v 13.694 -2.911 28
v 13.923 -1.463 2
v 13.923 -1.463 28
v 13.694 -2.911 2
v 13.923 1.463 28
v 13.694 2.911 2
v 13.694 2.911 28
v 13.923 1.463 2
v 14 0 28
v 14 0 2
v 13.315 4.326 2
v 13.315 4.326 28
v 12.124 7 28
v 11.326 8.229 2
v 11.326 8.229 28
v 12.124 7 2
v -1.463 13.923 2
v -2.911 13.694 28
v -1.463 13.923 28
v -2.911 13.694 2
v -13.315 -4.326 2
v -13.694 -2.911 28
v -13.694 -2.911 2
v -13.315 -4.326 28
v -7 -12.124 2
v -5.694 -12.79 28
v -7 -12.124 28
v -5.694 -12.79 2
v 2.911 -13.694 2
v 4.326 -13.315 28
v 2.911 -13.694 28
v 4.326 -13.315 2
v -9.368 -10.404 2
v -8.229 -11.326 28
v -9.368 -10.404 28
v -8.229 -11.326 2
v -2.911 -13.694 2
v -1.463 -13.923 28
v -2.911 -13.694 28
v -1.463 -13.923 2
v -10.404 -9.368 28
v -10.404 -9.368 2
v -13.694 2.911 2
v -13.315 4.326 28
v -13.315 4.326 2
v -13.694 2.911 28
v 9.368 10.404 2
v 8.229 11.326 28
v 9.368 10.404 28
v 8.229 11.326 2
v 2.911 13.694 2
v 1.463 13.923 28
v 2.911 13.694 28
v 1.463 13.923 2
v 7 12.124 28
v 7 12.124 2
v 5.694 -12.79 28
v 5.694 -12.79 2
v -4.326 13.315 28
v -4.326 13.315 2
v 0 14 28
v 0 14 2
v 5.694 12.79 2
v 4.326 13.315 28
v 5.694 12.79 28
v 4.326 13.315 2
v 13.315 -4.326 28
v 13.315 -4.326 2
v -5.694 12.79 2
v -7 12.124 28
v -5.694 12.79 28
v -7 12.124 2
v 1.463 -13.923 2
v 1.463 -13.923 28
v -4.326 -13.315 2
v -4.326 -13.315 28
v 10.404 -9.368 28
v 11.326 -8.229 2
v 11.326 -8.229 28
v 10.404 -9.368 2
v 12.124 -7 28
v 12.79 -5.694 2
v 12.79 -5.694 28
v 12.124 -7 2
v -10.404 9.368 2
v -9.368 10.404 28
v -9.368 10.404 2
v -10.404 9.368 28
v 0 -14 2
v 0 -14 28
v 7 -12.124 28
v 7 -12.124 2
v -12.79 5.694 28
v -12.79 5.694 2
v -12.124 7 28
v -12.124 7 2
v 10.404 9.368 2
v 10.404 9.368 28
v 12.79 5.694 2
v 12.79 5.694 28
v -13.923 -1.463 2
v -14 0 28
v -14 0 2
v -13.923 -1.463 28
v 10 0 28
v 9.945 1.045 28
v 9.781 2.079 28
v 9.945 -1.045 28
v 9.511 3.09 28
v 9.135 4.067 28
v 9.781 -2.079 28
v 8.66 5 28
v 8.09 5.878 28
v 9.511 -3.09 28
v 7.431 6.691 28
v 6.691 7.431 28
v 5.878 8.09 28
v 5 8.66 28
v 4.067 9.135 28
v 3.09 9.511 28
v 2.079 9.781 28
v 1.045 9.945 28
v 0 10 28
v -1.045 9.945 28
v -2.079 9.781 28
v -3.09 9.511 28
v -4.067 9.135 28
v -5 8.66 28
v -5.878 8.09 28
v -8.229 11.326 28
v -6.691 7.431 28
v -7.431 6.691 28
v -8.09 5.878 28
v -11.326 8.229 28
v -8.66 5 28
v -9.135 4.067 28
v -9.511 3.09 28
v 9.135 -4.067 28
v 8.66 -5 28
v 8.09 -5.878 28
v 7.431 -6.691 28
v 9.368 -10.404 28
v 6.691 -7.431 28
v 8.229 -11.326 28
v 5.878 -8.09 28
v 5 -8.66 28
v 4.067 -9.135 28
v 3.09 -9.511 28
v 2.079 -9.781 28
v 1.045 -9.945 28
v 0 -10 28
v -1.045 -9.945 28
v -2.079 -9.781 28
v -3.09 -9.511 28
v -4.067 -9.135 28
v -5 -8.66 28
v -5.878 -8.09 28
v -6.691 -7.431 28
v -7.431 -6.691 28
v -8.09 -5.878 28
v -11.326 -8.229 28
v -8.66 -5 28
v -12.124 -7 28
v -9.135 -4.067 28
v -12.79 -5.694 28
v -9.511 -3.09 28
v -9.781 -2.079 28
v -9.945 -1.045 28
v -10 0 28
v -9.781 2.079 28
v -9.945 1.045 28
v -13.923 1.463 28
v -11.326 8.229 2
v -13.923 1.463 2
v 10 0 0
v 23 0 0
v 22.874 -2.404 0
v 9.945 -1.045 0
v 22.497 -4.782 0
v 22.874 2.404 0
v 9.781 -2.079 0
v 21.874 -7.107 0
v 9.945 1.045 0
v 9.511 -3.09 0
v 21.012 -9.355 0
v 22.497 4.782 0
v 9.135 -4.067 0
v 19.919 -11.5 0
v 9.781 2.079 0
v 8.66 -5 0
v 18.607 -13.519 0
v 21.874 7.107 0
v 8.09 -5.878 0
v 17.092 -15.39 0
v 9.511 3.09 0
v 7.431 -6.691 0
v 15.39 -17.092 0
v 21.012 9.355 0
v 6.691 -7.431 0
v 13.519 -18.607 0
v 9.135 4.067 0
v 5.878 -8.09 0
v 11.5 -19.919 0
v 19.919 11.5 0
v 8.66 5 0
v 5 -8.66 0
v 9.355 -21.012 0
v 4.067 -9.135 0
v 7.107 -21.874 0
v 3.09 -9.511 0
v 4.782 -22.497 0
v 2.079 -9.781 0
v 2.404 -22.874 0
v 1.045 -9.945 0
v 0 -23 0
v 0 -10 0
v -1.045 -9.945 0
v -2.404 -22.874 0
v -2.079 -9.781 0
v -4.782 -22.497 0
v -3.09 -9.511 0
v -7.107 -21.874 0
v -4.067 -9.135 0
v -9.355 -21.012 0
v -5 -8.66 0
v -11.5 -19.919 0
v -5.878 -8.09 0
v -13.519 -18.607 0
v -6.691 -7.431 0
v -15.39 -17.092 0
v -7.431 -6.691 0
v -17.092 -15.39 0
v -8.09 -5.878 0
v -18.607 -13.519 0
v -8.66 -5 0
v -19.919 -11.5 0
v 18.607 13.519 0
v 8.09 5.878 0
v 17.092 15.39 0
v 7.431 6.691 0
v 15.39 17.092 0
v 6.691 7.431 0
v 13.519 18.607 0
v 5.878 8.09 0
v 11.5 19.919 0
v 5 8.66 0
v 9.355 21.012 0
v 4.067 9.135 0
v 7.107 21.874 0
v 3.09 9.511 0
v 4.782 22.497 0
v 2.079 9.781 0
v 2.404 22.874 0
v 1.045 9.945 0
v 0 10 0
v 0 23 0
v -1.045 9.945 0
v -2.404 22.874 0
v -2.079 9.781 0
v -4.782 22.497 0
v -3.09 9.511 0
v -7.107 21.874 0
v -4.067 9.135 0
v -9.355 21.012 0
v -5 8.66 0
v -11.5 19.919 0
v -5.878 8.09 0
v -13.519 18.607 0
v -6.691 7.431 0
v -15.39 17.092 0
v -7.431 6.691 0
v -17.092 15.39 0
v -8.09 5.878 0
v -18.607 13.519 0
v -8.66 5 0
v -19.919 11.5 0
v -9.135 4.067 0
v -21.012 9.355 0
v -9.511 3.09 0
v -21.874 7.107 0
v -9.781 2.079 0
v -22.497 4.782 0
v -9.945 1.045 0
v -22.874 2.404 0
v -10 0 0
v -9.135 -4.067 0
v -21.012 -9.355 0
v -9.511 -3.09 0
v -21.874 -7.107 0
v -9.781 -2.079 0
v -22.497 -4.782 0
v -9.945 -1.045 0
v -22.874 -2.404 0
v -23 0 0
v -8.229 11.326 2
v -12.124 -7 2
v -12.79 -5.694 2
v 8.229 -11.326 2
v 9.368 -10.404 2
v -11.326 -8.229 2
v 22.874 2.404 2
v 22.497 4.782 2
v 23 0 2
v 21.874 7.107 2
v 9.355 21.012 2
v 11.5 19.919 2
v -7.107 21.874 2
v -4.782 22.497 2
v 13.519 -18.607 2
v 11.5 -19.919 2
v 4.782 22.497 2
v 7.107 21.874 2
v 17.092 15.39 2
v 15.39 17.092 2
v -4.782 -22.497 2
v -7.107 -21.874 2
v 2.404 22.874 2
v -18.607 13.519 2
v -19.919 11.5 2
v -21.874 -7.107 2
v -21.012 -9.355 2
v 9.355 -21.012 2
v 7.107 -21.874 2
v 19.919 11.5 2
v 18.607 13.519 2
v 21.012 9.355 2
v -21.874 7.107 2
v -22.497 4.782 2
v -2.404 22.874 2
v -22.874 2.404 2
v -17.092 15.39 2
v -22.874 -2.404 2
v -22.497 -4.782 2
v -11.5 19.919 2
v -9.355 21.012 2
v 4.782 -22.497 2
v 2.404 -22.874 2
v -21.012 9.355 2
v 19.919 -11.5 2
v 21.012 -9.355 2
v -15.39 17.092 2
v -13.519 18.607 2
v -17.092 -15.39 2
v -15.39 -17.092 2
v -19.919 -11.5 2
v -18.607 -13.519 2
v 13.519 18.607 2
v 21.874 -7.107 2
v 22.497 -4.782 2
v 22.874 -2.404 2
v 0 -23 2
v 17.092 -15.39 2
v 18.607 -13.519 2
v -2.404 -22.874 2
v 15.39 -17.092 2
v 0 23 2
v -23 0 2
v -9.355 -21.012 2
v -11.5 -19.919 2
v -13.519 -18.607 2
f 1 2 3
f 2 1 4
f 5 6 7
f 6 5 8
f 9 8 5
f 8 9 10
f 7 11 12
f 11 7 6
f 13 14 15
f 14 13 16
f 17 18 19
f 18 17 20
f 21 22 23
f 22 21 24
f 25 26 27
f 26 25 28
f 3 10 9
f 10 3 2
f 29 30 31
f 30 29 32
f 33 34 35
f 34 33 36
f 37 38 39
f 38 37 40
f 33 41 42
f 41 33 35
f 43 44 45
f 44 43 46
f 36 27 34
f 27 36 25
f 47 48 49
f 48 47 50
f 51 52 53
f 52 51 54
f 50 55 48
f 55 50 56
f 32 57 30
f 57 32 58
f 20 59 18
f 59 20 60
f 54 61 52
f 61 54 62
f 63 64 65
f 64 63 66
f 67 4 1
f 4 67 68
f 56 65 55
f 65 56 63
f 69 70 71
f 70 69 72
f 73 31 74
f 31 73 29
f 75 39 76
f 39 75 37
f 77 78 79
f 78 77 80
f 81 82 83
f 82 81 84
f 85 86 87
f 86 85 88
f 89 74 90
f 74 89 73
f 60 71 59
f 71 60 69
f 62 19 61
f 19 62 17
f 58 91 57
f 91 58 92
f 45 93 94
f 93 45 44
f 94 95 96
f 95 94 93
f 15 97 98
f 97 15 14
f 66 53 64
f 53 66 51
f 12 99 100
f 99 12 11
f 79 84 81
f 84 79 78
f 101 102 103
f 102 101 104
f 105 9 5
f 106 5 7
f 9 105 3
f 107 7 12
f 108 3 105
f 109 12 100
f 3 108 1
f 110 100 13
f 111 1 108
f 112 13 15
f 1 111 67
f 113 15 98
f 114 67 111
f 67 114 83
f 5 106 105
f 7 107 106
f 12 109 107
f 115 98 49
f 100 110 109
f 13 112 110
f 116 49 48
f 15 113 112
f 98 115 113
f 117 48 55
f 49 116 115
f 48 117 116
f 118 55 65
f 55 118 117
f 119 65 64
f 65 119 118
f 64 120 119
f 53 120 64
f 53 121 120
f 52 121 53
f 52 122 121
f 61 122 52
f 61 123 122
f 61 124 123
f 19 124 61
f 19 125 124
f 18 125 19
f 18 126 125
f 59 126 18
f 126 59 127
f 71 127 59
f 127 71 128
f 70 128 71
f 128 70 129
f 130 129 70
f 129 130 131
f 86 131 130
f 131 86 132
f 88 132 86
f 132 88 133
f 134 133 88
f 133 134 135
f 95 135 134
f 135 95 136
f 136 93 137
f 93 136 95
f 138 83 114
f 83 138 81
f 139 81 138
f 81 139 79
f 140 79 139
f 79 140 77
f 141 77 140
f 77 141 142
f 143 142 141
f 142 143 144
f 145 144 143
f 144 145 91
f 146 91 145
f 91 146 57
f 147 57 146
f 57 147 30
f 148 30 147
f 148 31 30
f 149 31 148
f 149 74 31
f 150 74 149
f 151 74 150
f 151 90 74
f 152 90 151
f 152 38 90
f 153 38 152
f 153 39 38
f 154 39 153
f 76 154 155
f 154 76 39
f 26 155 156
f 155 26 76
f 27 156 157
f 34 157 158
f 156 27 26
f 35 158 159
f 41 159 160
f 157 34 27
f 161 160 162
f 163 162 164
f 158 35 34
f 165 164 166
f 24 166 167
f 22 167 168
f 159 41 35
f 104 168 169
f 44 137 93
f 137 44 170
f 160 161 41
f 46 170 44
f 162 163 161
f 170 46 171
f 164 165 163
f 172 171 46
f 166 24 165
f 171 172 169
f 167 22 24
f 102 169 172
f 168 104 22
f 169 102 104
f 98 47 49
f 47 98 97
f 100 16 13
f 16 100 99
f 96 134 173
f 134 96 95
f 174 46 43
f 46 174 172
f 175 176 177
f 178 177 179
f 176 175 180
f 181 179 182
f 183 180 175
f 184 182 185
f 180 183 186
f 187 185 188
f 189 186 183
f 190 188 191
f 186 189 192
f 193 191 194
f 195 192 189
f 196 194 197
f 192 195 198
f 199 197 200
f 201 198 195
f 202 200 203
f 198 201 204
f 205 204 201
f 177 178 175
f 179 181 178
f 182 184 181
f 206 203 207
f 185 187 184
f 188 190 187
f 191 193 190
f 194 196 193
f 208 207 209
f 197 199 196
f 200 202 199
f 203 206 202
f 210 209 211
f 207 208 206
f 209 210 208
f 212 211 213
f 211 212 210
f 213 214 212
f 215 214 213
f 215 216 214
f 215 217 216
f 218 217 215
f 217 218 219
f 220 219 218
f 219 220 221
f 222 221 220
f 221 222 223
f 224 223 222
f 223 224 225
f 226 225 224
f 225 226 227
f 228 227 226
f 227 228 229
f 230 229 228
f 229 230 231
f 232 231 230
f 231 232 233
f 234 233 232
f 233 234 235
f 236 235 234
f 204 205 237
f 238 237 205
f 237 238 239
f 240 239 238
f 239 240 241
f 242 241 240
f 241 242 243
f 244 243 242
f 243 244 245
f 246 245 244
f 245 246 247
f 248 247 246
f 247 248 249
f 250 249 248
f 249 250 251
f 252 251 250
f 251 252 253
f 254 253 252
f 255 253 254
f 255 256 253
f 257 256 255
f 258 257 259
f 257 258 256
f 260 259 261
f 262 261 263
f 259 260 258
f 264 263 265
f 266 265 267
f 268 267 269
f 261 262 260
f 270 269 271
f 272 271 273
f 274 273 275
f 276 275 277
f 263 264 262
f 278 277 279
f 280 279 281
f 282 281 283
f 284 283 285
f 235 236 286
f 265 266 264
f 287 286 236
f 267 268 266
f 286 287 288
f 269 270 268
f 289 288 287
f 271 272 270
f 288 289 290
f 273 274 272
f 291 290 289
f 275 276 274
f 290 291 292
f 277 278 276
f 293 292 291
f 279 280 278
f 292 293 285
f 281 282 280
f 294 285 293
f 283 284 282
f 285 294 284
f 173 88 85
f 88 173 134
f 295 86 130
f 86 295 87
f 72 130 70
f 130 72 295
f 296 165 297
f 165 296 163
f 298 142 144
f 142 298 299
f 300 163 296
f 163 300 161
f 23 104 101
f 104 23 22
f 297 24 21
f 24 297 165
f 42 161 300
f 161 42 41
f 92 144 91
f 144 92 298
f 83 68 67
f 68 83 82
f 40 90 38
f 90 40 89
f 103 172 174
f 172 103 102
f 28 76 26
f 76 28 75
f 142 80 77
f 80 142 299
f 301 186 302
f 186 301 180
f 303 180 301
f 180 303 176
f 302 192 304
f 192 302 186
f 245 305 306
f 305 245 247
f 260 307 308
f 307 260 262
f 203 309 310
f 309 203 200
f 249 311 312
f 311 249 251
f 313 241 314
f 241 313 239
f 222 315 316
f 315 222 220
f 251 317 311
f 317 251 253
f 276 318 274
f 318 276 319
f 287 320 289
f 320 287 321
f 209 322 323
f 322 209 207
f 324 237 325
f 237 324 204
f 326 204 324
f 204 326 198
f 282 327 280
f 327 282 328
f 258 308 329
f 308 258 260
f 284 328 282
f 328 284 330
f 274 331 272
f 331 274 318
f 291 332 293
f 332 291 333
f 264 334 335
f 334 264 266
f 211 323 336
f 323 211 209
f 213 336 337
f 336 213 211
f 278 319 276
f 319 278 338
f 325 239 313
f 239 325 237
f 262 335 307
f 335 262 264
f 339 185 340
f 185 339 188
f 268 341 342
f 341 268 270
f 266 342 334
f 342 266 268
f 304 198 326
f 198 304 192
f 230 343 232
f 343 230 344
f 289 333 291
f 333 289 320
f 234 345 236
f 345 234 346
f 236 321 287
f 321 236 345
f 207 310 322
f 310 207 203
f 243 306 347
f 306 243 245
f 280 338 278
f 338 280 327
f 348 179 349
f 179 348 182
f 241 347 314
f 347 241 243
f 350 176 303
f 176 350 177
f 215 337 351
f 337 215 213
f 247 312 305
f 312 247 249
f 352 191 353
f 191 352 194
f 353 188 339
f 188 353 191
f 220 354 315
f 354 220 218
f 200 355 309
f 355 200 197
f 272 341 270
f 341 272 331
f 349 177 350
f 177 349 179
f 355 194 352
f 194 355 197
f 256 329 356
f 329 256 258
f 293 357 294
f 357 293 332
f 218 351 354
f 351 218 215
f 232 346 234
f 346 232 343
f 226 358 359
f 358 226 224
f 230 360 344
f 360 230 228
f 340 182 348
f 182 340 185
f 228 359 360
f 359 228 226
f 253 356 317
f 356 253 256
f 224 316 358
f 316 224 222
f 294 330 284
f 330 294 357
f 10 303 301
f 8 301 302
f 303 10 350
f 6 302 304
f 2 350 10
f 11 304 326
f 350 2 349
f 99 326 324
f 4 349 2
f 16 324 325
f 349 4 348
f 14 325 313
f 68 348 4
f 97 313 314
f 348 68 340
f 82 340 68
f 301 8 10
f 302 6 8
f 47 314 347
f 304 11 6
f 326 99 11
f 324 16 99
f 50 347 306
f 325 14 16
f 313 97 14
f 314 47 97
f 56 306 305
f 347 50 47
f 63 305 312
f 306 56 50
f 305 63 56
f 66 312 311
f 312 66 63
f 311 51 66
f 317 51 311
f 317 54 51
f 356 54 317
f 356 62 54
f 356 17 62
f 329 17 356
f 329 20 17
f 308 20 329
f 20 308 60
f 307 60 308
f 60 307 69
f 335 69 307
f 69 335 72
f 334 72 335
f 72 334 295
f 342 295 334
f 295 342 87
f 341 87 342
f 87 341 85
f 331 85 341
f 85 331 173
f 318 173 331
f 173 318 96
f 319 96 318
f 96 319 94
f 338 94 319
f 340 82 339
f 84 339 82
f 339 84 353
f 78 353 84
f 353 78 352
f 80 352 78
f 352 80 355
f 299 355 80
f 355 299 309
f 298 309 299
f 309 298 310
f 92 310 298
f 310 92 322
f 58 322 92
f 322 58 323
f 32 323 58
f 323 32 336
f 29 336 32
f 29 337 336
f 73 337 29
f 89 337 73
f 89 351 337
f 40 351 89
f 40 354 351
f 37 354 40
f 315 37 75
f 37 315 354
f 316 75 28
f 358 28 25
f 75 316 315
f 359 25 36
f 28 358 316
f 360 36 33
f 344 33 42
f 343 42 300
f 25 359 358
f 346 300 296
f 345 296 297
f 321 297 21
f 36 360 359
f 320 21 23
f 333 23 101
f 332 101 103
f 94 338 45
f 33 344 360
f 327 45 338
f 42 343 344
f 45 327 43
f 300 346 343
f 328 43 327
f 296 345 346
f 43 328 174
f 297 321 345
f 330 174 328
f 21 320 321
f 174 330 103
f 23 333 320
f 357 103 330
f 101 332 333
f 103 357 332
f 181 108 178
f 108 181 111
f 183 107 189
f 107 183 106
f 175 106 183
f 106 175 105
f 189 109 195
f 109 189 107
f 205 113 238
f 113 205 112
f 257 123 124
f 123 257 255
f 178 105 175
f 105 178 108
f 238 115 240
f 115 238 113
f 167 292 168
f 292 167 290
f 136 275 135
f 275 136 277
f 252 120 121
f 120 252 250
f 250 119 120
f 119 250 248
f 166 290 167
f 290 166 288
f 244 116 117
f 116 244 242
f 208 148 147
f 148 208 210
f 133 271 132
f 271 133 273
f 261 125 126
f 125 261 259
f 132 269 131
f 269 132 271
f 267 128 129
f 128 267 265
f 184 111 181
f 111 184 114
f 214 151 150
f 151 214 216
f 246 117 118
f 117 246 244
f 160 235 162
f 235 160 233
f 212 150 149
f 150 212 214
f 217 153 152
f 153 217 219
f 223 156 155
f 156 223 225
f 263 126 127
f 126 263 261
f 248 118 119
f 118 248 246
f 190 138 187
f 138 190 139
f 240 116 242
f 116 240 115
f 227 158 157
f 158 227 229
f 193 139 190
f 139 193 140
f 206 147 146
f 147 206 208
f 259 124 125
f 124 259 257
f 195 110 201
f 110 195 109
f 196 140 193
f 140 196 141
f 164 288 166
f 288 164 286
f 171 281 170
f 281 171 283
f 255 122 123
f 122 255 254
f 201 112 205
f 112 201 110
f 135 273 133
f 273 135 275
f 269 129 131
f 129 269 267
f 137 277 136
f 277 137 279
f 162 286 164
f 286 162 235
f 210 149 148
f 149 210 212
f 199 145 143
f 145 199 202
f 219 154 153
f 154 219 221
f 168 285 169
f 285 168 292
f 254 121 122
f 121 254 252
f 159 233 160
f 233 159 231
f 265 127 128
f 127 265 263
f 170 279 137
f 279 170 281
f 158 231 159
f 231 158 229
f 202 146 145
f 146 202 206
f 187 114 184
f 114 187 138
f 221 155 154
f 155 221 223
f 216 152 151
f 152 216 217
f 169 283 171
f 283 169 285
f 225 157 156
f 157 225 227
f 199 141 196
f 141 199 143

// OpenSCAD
// Flanged spacer.
$fn = 60;
eps = 0.02;
inner_d = 20;
outer_d = 28;
length = 28;
flange_d = 46;
difference() { union() { cylinder(d=outer_d,h=length); cylinder(d=flange_d,h=2); } translate([0,0,-eps]) cylinder(d=inner_d,h=length+2*eps); }
